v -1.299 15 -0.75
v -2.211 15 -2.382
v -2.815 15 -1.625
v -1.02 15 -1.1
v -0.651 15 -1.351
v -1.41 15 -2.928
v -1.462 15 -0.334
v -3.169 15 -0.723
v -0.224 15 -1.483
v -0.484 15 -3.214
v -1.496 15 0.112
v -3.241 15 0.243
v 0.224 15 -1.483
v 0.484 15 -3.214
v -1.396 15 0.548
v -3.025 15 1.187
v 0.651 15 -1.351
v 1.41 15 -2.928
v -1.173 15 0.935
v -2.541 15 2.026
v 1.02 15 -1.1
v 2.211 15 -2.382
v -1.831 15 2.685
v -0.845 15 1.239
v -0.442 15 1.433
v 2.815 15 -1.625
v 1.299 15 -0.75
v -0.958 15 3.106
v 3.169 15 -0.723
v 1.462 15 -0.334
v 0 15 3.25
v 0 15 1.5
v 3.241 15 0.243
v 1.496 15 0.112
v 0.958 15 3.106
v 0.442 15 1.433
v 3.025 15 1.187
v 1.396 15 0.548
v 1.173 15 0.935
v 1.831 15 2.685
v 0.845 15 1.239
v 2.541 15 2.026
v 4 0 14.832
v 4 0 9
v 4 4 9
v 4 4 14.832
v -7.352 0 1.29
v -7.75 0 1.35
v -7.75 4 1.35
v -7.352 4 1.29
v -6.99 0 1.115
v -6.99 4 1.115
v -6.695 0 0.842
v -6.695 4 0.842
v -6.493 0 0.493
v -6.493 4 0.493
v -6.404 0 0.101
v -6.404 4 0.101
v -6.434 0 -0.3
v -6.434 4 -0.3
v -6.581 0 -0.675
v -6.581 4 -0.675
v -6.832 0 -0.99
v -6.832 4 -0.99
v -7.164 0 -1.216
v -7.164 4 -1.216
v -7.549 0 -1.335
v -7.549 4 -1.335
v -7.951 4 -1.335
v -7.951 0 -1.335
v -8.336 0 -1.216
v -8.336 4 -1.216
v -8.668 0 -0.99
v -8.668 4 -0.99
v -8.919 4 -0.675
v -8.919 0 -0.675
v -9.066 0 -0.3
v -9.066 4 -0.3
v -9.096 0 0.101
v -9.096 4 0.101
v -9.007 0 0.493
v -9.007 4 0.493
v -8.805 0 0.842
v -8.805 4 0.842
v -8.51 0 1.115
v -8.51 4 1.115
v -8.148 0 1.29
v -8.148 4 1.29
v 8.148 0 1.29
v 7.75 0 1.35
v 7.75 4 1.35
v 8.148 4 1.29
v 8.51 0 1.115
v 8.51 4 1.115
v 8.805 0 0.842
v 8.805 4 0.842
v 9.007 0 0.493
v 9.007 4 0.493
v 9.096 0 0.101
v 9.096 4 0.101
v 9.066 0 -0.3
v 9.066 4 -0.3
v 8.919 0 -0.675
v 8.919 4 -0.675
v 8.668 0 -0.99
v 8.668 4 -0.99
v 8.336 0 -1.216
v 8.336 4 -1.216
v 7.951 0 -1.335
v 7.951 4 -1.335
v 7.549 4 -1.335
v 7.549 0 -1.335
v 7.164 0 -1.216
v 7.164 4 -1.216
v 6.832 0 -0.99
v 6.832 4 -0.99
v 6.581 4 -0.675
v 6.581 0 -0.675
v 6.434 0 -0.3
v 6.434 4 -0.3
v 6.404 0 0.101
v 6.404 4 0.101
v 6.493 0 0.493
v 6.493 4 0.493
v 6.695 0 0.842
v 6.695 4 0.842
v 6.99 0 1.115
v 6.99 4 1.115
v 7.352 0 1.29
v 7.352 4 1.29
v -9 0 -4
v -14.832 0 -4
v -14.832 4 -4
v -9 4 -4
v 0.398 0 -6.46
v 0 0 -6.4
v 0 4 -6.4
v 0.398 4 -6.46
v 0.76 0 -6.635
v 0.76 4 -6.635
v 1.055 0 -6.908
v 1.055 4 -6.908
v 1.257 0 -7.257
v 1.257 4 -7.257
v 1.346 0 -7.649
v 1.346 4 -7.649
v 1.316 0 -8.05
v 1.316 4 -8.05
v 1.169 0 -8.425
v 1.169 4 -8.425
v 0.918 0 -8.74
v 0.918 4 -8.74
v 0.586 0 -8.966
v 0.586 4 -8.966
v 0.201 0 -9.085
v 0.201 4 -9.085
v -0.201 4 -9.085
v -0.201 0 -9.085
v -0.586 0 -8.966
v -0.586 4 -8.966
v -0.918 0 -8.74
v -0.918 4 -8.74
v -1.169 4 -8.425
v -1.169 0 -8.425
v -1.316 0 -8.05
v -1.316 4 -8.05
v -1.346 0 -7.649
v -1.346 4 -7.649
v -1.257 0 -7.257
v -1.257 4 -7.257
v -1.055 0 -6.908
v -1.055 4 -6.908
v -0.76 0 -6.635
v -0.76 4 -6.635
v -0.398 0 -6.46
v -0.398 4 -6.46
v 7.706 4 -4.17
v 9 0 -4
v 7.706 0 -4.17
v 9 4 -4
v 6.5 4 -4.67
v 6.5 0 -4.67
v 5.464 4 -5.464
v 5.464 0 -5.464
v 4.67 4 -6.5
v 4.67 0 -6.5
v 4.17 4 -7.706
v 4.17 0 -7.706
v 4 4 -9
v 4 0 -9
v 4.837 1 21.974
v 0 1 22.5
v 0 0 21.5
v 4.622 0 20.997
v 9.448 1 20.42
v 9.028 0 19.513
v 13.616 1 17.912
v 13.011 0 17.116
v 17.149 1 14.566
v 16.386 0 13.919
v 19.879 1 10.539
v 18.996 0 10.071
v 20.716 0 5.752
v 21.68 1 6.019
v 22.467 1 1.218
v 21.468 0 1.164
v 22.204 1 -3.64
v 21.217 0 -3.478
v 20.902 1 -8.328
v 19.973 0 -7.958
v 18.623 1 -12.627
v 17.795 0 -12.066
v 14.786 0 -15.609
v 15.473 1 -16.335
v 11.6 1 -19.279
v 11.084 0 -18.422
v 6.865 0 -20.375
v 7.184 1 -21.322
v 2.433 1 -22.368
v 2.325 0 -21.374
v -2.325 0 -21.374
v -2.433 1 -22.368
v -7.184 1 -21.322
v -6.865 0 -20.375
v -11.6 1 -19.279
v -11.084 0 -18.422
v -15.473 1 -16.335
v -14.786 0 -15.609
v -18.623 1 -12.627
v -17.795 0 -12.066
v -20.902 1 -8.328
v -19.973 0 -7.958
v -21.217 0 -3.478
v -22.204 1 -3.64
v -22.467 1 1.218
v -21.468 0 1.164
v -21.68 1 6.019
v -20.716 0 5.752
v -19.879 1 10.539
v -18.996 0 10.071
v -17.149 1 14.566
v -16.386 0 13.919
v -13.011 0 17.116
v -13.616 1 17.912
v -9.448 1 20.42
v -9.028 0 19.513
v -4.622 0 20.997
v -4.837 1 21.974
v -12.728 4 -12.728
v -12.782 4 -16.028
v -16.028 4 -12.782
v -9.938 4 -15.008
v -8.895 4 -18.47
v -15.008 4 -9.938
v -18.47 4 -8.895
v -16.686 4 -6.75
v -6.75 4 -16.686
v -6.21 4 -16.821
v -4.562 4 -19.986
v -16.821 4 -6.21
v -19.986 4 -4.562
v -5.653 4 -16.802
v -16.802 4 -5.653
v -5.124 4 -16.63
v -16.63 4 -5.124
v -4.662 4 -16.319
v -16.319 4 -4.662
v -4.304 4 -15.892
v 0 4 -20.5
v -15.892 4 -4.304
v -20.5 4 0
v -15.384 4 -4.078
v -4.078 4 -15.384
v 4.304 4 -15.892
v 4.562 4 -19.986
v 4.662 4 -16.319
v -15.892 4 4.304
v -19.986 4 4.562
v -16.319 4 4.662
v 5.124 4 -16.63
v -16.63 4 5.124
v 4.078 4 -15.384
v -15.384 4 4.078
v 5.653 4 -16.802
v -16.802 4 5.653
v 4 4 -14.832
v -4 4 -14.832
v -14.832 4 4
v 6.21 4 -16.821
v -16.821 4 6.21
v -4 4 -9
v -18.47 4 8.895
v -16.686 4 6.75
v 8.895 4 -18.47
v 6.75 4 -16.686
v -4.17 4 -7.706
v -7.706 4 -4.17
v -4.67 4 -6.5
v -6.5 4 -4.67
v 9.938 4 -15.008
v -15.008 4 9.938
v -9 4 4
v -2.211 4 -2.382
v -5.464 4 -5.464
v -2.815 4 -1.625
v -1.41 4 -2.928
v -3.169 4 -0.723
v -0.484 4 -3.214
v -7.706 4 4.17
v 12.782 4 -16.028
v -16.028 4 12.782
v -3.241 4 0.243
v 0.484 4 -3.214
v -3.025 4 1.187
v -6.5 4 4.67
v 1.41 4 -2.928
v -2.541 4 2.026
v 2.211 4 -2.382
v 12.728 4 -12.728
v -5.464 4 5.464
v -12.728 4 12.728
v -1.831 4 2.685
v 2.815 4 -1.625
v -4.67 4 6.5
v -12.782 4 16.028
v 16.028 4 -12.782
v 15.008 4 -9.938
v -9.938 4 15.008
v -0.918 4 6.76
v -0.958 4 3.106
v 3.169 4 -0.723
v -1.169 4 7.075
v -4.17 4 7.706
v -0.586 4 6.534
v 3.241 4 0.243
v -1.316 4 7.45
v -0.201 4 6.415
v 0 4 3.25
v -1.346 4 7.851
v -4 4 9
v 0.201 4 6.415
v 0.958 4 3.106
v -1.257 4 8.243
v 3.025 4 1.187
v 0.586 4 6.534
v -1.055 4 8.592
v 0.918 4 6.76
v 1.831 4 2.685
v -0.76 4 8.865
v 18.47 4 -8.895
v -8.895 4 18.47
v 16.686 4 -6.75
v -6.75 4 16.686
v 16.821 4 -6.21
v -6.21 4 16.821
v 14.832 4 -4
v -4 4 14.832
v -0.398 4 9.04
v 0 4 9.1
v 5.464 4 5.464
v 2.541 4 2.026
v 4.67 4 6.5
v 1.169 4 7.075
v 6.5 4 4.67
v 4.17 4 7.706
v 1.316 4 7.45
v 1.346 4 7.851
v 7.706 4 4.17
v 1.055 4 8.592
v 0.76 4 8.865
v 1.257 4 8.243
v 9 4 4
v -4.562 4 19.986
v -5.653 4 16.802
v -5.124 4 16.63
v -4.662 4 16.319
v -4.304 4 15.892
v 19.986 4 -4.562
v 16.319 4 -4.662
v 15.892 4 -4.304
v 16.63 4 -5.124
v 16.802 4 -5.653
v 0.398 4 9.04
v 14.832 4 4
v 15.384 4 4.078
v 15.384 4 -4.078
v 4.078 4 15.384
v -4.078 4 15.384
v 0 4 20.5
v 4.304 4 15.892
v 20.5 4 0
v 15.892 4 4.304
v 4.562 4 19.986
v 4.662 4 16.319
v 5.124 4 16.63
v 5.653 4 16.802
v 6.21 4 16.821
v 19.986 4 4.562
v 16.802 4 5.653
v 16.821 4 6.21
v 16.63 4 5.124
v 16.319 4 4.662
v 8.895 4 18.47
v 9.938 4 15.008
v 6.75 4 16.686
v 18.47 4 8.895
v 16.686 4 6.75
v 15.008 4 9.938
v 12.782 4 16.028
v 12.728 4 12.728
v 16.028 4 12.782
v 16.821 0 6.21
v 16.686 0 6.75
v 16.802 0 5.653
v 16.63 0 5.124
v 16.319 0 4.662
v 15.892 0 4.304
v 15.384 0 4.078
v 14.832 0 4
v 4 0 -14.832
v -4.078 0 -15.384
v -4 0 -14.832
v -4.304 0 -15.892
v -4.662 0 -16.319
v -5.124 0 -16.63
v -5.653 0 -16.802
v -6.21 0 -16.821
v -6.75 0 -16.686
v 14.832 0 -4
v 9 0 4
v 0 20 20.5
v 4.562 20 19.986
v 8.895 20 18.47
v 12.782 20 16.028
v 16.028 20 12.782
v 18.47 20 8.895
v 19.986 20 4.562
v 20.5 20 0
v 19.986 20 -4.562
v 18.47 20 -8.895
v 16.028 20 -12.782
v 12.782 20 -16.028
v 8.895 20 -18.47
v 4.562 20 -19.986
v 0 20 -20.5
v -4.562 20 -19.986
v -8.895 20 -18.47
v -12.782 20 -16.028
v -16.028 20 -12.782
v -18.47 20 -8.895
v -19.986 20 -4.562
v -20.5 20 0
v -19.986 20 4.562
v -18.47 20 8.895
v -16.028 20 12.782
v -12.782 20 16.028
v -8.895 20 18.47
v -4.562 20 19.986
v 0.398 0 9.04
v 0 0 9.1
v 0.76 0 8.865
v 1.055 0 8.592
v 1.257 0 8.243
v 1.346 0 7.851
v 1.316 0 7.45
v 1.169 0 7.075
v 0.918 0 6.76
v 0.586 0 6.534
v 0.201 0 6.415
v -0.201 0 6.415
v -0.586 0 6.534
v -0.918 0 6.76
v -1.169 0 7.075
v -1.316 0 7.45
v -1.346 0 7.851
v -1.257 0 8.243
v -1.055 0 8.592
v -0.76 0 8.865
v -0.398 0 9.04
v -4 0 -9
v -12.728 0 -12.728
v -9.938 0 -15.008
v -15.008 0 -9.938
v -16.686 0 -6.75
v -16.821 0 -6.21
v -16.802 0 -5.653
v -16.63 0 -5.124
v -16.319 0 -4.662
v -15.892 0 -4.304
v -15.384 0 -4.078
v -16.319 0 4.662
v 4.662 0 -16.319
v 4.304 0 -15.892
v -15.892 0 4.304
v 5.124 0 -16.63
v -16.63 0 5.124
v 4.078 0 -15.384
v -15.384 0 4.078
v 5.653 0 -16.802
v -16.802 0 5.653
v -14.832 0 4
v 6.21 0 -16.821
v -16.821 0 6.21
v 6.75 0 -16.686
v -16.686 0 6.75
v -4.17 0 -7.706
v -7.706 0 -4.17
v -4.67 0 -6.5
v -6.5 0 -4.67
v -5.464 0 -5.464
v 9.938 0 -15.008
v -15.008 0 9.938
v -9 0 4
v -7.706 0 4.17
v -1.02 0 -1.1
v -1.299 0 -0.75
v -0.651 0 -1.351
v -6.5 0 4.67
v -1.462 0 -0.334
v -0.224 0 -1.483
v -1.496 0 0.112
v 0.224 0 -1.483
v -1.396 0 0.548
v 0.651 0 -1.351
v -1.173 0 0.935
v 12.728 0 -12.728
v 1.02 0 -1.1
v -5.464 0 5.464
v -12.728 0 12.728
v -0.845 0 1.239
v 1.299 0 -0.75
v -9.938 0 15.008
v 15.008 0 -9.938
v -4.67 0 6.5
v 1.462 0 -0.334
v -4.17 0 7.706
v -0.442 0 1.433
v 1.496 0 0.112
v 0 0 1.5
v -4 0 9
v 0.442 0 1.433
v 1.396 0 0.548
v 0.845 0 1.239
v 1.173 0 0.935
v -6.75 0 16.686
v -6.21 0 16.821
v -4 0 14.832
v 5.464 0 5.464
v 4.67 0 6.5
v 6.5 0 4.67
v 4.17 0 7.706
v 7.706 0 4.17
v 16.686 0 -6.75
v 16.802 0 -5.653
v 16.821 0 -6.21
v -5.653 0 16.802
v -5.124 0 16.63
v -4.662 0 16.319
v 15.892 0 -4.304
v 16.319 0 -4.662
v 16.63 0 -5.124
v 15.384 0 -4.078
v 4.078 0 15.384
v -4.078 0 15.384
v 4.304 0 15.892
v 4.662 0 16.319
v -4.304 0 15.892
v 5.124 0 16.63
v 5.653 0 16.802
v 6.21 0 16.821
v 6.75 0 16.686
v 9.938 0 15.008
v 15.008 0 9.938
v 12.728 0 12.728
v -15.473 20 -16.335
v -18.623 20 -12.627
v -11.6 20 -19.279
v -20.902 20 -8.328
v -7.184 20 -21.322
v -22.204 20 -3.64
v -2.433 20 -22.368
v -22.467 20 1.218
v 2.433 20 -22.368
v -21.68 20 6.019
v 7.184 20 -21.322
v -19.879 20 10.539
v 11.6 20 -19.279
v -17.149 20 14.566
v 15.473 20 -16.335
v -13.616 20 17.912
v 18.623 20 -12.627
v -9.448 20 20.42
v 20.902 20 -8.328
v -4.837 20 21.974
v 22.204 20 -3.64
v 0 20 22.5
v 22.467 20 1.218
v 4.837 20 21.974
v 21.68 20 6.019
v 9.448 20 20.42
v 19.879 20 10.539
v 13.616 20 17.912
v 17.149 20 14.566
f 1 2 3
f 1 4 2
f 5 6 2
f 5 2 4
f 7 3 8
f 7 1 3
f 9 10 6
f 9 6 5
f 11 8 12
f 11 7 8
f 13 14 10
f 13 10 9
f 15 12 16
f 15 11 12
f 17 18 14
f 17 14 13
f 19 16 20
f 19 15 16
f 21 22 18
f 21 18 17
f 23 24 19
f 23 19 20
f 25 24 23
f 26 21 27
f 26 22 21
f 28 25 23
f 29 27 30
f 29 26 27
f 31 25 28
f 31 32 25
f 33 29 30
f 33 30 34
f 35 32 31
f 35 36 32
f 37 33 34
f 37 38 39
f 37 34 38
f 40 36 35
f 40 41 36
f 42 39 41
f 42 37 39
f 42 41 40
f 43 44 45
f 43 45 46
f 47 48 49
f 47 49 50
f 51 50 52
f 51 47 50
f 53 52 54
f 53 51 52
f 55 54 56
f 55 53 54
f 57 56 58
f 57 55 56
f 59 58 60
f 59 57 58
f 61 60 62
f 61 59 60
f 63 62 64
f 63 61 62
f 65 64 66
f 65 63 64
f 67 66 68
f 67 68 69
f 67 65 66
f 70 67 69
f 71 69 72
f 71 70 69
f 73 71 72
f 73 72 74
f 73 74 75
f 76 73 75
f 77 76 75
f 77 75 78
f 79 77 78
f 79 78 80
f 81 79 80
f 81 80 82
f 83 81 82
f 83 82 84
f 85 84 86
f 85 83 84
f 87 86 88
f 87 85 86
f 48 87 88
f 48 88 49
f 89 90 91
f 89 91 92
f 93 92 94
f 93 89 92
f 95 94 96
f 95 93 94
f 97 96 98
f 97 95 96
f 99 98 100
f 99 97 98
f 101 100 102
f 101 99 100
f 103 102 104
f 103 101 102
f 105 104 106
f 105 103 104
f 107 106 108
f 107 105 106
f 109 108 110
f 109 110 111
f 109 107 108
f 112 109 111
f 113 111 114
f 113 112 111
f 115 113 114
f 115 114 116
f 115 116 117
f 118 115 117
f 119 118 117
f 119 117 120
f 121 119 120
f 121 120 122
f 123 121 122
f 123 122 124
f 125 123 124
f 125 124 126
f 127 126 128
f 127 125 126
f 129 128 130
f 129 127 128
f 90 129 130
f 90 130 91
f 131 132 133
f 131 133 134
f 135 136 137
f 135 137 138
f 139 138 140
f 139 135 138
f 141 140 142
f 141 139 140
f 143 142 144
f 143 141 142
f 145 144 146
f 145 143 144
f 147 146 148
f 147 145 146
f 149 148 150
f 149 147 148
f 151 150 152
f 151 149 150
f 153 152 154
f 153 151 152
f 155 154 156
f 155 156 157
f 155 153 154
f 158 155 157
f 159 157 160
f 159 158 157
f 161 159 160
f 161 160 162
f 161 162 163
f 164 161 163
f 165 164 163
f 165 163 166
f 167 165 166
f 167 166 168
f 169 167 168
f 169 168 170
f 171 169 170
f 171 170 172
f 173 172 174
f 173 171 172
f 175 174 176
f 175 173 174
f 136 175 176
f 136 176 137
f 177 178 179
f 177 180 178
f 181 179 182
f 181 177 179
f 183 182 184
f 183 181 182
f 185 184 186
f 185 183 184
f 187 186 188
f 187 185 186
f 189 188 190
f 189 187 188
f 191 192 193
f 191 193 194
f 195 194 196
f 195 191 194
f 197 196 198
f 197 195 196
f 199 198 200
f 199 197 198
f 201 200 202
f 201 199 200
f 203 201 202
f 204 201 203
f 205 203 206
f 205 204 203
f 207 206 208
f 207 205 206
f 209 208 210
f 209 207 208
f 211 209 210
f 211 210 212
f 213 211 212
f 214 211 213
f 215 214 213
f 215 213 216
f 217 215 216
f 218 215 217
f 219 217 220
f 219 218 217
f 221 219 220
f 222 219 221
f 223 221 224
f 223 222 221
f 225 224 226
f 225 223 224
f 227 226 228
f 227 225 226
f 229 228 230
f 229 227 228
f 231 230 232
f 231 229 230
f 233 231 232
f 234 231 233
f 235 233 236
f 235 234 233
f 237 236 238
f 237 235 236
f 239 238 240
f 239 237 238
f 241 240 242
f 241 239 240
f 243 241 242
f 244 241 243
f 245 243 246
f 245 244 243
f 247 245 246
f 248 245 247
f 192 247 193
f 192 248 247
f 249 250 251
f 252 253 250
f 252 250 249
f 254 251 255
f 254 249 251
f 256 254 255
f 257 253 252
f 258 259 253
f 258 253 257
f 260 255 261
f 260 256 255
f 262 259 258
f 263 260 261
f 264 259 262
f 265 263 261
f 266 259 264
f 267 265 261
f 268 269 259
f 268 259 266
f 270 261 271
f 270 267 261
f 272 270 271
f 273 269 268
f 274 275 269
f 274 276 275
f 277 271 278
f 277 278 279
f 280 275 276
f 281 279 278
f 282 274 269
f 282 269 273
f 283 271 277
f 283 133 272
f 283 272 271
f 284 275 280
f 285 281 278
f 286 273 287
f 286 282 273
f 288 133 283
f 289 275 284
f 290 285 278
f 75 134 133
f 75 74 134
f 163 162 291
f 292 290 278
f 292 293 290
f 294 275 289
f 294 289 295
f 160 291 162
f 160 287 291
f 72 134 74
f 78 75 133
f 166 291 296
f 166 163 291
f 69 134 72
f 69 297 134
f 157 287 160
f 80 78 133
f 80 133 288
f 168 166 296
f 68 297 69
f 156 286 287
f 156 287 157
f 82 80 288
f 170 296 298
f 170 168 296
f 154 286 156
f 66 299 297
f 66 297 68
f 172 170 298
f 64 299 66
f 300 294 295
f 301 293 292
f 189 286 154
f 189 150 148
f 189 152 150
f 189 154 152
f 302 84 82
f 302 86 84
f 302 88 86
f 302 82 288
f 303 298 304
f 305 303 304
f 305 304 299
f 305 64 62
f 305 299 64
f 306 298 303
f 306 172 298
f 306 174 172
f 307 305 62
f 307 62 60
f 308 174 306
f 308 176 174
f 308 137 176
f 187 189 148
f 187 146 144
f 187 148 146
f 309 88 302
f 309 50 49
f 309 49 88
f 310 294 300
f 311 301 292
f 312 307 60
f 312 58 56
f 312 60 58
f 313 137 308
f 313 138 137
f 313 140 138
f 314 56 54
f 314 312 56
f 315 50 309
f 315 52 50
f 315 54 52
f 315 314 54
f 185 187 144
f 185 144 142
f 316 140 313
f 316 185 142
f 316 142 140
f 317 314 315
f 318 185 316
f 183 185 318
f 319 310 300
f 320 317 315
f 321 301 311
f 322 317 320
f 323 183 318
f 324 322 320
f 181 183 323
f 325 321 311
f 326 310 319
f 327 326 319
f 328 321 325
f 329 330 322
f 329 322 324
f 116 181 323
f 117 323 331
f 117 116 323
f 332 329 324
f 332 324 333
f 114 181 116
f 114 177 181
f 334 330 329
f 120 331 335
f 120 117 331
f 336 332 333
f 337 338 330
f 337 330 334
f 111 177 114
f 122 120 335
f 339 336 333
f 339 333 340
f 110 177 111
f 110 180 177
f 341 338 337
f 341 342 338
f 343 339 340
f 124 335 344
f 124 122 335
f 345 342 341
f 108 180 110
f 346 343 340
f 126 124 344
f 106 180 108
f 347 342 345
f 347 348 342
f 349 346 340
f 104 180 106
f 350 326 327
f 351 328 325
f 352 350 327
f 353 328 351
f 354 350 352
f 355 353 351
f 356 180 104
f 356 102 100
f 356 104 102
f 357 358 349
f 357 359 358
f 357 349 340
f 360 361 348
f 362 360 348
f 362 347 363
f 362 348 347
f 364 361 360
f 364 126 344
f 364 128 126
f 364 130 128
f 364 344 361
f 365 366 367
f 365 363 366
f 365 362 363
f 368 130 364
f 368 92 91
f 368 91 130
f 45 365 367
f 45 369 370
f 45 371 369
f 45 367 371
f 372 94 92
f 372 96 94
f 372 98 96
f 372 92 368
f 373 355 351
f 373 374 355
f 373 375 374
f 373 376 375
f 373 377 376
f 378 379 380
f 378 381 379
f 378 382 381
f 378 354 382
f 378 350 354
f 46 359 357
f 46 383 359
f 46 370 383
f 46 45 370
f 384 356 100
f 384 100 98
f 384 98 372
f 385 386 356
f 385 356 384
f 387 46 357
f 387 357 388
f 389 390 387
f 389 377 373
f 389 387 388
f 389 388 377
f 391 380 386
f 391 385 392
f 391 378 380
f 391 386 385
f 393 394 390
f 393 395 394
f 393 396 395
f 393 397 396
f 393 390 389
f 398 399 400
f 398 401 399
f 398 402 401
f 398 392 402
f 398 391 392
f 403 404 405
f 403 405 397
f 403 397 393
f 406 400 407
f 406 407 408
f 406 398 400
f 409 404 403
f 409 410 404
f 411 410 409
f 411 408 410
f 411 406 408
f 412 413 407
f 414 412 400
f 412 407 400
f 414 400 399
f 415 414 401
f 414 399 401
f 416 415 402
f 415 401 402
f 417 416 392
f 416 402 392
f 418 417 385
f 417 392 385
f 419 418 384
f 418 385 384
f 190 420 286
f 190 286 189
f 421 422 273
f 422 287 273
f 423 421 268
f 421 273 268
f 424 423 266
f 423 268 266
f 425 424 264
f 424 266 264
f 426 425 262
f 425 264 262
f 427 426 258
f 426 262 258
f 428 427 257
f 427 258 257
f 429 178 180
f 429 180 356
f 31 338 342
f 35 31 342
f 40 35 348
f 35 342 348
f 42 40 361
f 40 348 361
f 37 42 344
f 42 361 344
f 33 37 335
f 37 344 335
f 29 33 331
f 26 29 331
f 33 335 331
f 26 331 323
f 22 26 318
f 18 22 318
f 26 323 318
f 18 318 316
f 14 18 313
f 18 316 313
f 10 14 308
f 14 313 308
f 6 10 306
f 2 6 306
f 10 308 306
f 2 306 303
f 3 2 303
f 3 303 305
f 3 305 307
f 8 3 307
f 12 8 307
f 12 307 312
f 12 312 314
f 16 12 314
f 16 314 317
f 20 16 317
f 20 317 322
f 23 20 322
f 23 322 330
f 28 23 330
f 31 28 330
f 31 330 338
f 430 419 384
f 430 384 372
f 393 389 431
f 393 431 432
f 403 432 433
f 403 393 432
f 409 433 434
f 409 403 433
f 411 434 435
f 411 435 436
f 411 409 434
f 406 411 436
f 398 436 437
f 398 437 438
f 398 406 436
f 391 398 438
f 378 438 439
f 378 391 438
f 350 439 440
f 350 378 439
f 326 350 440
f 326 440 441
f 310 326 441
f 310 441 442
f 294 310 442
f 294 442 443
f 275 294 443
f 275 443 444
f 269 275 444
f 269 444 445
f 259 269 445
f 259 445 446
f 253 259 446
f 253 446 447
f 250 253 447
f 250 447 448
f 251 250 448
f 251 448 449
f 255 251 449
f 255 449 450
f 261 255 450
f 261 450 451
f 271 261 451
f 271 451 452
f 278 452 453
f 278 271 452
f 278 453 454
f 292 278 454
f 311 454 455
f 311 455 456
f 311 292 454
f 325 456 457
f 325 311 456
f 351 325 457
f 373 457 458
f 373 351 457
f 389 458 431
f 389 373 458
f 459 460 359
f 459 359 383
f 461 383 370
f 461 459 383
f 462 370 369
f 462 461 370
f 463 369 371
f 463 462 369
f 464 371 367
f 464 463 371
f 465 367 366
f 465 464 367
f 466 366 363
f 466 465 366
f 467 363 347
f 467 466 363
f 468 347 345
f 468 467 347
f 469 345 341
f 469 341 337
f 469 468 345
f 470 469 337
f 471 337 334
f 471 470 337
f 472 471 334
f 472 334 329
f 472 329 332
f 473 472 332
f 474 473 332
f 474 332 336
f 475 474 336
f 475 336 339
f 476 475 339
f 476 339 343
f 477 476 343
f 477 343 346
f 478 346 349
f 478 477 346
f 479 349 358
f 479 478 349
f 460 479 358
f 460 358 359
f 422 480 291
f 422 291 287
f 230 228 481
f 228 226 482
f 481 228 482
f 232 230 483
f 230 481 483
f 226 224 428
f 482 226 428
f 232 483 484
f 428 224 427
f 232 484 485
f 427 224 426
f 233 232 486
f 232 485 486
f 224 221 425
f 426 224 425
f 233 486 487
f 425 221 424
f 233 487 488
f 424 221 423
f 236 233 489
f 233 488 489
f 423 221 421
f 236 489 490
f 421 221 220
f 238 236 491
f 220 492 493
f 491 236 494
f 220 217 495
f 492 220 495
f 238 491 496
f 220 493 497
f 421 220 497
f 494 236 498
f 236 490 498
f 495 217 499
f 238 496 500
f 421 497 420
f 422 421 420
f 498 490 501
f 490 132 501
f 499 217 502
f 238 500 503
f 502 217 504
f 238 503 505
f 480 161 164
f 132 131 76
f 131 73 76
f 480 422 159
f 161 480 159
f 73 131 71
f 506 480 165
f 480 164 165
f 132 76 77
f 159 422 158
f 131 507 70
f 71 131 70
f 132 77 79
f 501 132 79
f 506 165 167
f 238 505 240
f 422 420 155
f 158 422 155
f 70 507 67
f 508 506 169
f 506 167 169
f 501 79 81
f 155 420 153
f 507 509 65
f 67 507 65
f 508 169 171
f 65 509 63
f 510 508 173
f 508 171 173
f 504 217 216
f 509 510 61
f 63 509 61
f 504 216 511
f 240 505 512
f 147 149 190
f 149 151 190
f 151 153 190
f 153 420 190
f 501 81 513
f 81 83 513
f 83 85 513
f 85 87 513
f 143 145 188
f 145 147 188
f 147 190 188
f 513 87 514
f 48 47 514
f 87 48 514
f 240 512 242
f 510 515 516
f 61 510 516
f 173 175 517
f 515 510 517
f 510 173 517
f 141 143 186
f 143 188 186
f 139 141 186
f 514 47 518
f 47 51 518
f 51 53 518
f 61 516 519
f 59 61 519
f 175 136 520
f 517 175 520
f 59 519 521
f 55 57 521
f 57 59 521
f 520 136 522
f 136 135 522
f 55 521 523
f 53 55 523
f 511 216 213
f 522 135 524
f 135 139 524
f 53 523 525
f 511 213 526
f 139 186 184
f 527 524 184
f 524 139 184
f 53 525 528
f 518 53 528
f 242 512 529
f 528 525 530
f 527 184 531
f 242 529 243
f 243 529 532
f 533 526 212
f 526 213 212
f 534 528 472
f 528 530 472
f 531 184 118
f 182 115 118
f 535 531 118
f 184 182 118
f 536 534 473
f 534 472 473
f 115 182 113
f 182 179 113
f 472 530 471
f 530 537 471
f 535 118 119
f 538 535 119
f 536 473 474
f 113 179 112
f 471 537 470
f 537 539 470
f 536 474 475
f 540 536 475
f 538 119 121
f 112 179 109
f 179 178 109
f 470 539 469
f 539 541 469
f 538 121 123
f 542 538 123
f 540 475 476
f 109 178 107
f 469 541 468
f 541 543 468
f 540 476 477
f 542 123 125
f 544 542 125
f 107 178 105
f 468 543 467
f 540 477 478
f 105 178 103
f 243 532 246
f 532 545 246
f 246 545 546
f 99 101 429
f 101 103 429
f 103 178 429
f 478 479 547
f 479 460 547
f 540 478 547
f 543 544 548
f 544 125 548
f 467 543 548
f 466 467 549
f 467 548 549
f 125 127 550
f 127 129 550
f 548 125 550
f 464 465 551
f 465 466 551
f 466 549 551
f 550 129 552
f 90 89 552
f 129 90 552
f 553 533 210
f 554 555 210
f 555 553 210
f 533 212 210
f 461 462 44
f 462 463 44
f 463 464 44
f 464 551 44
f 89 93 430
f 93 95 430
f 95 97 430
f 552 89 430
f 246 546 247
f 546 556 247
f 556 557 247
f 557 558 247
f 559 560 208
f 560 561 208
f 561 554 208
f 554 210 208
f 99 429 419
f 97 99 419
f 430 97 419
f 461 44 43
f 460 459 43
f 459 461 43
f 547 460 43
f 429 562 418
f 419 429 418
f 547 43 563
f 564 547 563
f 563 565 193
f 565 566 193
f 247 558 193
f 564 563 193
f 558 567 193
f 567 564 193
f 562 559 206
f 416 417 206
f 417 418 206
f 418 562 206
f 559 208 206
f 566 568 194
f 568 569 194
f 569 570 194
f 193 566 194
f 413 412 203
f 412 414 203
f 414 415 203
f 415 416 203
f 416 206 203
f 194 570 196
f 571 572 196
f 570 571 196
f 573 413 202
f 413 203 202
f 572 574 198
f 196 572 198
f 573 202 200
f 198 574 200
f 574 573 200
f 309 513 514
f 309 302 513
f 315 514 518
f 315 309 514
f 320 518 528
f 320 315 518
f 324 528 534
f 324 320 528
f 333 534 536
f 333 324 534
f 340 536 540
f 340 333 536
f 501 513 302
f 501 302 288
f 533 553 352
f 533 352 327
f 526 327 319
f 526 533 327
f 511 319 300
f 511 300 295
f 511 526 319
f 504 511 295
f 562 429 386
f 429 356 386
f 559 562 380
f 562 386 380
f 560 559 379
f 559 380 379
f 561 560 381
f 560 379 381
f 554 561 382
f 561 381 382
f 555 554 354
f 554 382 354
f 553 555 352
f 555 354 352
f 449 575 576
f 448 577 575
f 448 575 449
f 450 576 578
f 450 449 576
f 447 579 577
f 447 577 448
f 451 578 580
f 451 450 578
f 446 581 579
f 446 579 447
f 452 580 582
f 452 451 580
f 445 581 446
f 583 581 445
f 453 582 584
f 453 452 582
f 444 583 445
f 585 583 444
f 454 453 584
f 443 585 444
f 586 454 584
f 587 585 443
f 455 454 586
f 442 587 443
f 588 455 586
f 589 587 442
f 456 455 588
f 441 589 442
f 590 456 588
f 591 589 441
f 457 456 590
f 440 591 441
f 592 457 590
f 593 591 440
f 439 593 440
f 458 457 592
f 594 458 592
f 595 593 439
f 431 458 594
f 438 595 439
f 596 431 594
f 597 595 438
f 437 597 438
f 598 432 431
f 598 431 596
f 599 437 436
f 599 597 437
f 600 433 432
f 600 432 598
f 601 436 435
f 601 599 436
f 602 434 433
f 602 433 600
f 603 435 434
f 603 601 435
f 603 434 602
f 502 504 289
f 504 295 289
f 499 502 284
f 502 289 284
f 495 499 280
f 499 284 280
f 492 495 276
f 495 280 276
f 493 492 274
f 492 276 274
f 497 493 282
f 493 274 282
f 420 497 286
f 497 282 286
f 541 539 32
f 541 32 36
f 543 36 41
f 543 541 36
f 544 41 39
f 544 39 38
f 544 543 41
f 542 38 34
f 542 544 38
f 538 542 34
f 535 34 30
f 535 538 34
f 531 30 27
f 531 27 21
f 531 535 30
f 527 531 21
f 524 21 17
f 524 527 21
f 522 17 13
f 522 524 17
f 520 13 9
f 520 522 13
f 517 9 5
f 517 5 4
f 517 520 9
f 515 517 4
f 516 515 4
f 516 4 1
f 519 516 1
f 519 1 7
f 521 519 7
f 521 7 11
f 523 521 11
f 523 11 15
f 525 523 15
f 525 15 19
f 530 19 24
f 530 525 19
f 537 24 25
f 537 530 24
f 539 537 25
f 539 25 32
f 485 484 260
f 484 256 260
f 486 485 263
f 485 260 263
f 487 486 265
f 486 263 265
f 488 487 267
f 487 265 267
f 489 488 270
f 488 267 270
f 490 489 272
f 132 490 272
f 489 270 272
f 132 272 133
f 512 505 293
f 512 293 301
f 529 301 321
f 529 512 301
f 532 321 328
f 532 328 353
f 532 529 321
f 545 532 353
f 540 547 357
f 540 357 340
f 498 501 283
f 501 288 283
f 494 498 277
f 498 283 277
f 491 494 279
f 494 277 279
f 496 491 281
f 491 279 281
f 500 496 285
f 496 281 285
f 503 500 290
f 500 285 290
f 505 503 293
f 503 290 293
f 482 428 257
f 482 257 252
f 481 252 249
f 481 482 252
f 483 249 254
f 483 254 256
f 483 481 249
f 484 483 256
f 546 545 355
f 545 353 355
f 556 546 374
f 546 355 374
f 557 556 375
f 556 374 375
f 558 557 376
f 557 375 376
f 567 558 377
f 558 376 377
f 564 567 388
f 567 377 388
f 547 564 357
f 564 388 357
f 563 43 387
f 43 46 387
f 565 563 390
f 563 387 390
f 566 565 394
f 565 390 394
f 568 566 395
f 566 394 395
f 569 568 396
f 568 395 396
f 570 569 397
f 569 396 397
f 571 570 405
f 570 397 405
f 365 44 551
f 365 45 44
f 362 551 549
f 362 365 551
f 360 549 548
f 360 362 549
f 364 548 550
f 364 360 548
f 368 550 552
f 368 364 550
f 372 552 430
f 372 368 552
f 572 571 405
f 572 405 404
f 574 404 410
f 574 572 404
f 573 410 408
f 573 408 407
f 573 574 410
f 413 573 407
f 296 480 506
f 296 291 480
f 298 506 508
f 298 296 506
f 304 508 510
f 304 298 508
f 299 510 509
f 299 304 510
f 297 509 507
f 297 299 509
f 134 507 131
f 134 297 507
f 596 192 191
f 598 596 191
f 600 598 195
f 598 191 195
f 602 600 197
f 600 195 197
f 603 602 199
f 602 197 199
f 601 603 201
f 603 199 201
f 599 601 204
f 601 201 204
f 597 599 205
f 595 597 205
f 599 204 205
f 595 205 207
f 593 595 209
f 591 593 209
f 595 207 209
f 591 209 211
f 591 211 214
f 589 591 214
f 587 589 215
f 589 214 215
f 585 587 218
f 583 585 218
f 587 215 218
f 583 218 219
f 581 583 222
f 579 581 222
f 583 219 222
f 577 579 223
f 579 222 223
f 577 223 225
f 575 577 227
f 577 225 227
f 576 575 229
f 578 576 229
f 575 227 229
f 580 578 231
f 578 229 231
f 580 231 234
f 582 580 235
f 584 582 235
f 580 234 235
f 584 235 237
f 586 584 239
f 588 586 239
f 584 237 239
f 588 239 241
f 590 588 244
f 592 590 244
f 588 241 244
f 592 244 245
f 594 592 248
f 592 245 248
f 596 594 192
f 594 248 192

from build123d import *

# Parameters (mm, degrees)
SKETCH_1_R      = 20.5
SKETCH_1_R_2    = 1.35
SKETCH_1_R_3    = 3.25
EXTRUDE_1_DEPTH = 4
SKETCH_1_3_R    = 3.25
SKETCH_1_3_R_2  = 1.5
EXTRUDE_2_DEPTH = 15
SKETCH_1_4_R    = 22.5
SKETCH_1_4_R_2  = 20.5
EXTRUDE_3_DEPTH = 20
FILLET_1_R      = 5
FILLET_2_R      = 2
CHAMFER_1_SIZE  = 1


with BuildPart() as part:
    # 草图1 → 凸台-拉伸1 (new body)
    with BuildSketch(Plane(origin=(0, 0, 0), x_dir=(1, 0, 0), z_dir=(0, 1, 0))):
        Circle(SKETCH_1_R)
        with BuildLine():
            Line((-4, -4), (-4, -17.549928775))
            ThreePointArc((-4, -17.549928775), (-12.727922061, -12.727922061), (-17.549928775, -4))
            Line((-17.549928775, -4), (-4, -4))
        make_face(mode=Mode.SUBTRACT)
        with Locations((0, -7.75)):
            Circle(SKETCH_1_R_2, mode=Mode.SUBTRACT)
        with BuildLine():
            Line((4, -4), (17.549928775, -4))
            ThreePointArc((17.549928775, -4), (12.727922061, -12.727922061), (4, -17.549928775))
            Line((4, -17.549928775), (4, -4))
        make_face(mode=Mode.SUBTRACT)
        with Locations((-7.75, 0)):
            Circle(SKETCH_1_R_2, mode=Mode.SUBTRACT)
        with BuildLine():
            Line((-4, 4), (-17.549928775, 4))
            ThreePointArc((-17.549928775, 4), (-12.727922061, 12.727922061), (-4, 17.549928775))
            Line((-4, 17.549928775), (-4, 4))
        make_face(mode=Mode.SUBTRACT)
        Circle(SKETCH_1_R_3, mode=Mode.SUBTRACT)
        with Locations((7.75, 0)):
            Circle(SKETCH_1_R_2, mode=Mode.SUBTRACT)
        with Locations((0, 7.75)):
            Circle(SKETCH_1_R_2, mode=Mode.SUBTRACT)
        with BuildLine():
            Line((4, 4), (4, 17.549928775))
            ThreePointArc((4, 17.549928775), (12.727922061, 12.727922061), (17.549928775, 4))
            Line((17.549928775, 4), (4, 4))
        make_face(mode=Mode.SUBTRACT)
    extrude(amount=EXTRUDE_1_DEPTH)

    # 草图1<3> → 凸台-拉伸2 (add)
    with BuildSketch(Plane(origin=(0, 0, 0), x_dir=(1, 0, 0), z_dir=(0, 1, 0))):
        Circle(SKETCH_1_3_R)
        Circle(SKETCH_1_3_R_2, mode=Mode.SUBTRACT)
    extrude(amount=EXTRUDE_2_DEPTH)

    # 草图1<4> → 凸台-拉伸3 (add)
    with BuildSketch(Plane(origin=(0, 0, 0), x_dir=(1, 0, 0), z_dir=(0, 1, 0))):
        Circle(SKETCH_1_4_R)
        Circle(SKETCH_1_4_R_2, mode=Mode.SUBTRACT)
    extrude(amount=EXTRUDE_3_DEPTH)

    # 圆角1
    fillet_1_edges = [part.edges().sort_by_distance(p)[0] for p in [
        (-4, 2, 4),
        (4, 2, 4),
        (4, 2, -4),
        (-4, 2, -4),
    ]]
    fillet(fillet_1_edges, radius=FILLET_1_R)

    # 圆角2
    fillet_2_edges = [part.edges().sort_by_distance(p)[0] for p in [
        (4, 2, 17.549928775),
        (17.549928775, 2, 4),
        (17.549928775, 2, -4),
        (4, 2, -17.549928775),
        (-4, 2, 17.549928775),
        (-17.549928775, 2, 4),
        (-4, 2, -17.549928775),
        (-17.549928775, 2, -4),
    ]]
    fillet(fillet_2_edges, radius=FILLET_2_R)

    # 倒角1
    chamfer_1_edges = [part.edges().sort_by_distance(p)[0] for p in [
        (-22.5, 0, 0),
    ]]
    chamfer(chamfer_1_edges, length=CHAMFER_1_SIZE)


solid = part.part
